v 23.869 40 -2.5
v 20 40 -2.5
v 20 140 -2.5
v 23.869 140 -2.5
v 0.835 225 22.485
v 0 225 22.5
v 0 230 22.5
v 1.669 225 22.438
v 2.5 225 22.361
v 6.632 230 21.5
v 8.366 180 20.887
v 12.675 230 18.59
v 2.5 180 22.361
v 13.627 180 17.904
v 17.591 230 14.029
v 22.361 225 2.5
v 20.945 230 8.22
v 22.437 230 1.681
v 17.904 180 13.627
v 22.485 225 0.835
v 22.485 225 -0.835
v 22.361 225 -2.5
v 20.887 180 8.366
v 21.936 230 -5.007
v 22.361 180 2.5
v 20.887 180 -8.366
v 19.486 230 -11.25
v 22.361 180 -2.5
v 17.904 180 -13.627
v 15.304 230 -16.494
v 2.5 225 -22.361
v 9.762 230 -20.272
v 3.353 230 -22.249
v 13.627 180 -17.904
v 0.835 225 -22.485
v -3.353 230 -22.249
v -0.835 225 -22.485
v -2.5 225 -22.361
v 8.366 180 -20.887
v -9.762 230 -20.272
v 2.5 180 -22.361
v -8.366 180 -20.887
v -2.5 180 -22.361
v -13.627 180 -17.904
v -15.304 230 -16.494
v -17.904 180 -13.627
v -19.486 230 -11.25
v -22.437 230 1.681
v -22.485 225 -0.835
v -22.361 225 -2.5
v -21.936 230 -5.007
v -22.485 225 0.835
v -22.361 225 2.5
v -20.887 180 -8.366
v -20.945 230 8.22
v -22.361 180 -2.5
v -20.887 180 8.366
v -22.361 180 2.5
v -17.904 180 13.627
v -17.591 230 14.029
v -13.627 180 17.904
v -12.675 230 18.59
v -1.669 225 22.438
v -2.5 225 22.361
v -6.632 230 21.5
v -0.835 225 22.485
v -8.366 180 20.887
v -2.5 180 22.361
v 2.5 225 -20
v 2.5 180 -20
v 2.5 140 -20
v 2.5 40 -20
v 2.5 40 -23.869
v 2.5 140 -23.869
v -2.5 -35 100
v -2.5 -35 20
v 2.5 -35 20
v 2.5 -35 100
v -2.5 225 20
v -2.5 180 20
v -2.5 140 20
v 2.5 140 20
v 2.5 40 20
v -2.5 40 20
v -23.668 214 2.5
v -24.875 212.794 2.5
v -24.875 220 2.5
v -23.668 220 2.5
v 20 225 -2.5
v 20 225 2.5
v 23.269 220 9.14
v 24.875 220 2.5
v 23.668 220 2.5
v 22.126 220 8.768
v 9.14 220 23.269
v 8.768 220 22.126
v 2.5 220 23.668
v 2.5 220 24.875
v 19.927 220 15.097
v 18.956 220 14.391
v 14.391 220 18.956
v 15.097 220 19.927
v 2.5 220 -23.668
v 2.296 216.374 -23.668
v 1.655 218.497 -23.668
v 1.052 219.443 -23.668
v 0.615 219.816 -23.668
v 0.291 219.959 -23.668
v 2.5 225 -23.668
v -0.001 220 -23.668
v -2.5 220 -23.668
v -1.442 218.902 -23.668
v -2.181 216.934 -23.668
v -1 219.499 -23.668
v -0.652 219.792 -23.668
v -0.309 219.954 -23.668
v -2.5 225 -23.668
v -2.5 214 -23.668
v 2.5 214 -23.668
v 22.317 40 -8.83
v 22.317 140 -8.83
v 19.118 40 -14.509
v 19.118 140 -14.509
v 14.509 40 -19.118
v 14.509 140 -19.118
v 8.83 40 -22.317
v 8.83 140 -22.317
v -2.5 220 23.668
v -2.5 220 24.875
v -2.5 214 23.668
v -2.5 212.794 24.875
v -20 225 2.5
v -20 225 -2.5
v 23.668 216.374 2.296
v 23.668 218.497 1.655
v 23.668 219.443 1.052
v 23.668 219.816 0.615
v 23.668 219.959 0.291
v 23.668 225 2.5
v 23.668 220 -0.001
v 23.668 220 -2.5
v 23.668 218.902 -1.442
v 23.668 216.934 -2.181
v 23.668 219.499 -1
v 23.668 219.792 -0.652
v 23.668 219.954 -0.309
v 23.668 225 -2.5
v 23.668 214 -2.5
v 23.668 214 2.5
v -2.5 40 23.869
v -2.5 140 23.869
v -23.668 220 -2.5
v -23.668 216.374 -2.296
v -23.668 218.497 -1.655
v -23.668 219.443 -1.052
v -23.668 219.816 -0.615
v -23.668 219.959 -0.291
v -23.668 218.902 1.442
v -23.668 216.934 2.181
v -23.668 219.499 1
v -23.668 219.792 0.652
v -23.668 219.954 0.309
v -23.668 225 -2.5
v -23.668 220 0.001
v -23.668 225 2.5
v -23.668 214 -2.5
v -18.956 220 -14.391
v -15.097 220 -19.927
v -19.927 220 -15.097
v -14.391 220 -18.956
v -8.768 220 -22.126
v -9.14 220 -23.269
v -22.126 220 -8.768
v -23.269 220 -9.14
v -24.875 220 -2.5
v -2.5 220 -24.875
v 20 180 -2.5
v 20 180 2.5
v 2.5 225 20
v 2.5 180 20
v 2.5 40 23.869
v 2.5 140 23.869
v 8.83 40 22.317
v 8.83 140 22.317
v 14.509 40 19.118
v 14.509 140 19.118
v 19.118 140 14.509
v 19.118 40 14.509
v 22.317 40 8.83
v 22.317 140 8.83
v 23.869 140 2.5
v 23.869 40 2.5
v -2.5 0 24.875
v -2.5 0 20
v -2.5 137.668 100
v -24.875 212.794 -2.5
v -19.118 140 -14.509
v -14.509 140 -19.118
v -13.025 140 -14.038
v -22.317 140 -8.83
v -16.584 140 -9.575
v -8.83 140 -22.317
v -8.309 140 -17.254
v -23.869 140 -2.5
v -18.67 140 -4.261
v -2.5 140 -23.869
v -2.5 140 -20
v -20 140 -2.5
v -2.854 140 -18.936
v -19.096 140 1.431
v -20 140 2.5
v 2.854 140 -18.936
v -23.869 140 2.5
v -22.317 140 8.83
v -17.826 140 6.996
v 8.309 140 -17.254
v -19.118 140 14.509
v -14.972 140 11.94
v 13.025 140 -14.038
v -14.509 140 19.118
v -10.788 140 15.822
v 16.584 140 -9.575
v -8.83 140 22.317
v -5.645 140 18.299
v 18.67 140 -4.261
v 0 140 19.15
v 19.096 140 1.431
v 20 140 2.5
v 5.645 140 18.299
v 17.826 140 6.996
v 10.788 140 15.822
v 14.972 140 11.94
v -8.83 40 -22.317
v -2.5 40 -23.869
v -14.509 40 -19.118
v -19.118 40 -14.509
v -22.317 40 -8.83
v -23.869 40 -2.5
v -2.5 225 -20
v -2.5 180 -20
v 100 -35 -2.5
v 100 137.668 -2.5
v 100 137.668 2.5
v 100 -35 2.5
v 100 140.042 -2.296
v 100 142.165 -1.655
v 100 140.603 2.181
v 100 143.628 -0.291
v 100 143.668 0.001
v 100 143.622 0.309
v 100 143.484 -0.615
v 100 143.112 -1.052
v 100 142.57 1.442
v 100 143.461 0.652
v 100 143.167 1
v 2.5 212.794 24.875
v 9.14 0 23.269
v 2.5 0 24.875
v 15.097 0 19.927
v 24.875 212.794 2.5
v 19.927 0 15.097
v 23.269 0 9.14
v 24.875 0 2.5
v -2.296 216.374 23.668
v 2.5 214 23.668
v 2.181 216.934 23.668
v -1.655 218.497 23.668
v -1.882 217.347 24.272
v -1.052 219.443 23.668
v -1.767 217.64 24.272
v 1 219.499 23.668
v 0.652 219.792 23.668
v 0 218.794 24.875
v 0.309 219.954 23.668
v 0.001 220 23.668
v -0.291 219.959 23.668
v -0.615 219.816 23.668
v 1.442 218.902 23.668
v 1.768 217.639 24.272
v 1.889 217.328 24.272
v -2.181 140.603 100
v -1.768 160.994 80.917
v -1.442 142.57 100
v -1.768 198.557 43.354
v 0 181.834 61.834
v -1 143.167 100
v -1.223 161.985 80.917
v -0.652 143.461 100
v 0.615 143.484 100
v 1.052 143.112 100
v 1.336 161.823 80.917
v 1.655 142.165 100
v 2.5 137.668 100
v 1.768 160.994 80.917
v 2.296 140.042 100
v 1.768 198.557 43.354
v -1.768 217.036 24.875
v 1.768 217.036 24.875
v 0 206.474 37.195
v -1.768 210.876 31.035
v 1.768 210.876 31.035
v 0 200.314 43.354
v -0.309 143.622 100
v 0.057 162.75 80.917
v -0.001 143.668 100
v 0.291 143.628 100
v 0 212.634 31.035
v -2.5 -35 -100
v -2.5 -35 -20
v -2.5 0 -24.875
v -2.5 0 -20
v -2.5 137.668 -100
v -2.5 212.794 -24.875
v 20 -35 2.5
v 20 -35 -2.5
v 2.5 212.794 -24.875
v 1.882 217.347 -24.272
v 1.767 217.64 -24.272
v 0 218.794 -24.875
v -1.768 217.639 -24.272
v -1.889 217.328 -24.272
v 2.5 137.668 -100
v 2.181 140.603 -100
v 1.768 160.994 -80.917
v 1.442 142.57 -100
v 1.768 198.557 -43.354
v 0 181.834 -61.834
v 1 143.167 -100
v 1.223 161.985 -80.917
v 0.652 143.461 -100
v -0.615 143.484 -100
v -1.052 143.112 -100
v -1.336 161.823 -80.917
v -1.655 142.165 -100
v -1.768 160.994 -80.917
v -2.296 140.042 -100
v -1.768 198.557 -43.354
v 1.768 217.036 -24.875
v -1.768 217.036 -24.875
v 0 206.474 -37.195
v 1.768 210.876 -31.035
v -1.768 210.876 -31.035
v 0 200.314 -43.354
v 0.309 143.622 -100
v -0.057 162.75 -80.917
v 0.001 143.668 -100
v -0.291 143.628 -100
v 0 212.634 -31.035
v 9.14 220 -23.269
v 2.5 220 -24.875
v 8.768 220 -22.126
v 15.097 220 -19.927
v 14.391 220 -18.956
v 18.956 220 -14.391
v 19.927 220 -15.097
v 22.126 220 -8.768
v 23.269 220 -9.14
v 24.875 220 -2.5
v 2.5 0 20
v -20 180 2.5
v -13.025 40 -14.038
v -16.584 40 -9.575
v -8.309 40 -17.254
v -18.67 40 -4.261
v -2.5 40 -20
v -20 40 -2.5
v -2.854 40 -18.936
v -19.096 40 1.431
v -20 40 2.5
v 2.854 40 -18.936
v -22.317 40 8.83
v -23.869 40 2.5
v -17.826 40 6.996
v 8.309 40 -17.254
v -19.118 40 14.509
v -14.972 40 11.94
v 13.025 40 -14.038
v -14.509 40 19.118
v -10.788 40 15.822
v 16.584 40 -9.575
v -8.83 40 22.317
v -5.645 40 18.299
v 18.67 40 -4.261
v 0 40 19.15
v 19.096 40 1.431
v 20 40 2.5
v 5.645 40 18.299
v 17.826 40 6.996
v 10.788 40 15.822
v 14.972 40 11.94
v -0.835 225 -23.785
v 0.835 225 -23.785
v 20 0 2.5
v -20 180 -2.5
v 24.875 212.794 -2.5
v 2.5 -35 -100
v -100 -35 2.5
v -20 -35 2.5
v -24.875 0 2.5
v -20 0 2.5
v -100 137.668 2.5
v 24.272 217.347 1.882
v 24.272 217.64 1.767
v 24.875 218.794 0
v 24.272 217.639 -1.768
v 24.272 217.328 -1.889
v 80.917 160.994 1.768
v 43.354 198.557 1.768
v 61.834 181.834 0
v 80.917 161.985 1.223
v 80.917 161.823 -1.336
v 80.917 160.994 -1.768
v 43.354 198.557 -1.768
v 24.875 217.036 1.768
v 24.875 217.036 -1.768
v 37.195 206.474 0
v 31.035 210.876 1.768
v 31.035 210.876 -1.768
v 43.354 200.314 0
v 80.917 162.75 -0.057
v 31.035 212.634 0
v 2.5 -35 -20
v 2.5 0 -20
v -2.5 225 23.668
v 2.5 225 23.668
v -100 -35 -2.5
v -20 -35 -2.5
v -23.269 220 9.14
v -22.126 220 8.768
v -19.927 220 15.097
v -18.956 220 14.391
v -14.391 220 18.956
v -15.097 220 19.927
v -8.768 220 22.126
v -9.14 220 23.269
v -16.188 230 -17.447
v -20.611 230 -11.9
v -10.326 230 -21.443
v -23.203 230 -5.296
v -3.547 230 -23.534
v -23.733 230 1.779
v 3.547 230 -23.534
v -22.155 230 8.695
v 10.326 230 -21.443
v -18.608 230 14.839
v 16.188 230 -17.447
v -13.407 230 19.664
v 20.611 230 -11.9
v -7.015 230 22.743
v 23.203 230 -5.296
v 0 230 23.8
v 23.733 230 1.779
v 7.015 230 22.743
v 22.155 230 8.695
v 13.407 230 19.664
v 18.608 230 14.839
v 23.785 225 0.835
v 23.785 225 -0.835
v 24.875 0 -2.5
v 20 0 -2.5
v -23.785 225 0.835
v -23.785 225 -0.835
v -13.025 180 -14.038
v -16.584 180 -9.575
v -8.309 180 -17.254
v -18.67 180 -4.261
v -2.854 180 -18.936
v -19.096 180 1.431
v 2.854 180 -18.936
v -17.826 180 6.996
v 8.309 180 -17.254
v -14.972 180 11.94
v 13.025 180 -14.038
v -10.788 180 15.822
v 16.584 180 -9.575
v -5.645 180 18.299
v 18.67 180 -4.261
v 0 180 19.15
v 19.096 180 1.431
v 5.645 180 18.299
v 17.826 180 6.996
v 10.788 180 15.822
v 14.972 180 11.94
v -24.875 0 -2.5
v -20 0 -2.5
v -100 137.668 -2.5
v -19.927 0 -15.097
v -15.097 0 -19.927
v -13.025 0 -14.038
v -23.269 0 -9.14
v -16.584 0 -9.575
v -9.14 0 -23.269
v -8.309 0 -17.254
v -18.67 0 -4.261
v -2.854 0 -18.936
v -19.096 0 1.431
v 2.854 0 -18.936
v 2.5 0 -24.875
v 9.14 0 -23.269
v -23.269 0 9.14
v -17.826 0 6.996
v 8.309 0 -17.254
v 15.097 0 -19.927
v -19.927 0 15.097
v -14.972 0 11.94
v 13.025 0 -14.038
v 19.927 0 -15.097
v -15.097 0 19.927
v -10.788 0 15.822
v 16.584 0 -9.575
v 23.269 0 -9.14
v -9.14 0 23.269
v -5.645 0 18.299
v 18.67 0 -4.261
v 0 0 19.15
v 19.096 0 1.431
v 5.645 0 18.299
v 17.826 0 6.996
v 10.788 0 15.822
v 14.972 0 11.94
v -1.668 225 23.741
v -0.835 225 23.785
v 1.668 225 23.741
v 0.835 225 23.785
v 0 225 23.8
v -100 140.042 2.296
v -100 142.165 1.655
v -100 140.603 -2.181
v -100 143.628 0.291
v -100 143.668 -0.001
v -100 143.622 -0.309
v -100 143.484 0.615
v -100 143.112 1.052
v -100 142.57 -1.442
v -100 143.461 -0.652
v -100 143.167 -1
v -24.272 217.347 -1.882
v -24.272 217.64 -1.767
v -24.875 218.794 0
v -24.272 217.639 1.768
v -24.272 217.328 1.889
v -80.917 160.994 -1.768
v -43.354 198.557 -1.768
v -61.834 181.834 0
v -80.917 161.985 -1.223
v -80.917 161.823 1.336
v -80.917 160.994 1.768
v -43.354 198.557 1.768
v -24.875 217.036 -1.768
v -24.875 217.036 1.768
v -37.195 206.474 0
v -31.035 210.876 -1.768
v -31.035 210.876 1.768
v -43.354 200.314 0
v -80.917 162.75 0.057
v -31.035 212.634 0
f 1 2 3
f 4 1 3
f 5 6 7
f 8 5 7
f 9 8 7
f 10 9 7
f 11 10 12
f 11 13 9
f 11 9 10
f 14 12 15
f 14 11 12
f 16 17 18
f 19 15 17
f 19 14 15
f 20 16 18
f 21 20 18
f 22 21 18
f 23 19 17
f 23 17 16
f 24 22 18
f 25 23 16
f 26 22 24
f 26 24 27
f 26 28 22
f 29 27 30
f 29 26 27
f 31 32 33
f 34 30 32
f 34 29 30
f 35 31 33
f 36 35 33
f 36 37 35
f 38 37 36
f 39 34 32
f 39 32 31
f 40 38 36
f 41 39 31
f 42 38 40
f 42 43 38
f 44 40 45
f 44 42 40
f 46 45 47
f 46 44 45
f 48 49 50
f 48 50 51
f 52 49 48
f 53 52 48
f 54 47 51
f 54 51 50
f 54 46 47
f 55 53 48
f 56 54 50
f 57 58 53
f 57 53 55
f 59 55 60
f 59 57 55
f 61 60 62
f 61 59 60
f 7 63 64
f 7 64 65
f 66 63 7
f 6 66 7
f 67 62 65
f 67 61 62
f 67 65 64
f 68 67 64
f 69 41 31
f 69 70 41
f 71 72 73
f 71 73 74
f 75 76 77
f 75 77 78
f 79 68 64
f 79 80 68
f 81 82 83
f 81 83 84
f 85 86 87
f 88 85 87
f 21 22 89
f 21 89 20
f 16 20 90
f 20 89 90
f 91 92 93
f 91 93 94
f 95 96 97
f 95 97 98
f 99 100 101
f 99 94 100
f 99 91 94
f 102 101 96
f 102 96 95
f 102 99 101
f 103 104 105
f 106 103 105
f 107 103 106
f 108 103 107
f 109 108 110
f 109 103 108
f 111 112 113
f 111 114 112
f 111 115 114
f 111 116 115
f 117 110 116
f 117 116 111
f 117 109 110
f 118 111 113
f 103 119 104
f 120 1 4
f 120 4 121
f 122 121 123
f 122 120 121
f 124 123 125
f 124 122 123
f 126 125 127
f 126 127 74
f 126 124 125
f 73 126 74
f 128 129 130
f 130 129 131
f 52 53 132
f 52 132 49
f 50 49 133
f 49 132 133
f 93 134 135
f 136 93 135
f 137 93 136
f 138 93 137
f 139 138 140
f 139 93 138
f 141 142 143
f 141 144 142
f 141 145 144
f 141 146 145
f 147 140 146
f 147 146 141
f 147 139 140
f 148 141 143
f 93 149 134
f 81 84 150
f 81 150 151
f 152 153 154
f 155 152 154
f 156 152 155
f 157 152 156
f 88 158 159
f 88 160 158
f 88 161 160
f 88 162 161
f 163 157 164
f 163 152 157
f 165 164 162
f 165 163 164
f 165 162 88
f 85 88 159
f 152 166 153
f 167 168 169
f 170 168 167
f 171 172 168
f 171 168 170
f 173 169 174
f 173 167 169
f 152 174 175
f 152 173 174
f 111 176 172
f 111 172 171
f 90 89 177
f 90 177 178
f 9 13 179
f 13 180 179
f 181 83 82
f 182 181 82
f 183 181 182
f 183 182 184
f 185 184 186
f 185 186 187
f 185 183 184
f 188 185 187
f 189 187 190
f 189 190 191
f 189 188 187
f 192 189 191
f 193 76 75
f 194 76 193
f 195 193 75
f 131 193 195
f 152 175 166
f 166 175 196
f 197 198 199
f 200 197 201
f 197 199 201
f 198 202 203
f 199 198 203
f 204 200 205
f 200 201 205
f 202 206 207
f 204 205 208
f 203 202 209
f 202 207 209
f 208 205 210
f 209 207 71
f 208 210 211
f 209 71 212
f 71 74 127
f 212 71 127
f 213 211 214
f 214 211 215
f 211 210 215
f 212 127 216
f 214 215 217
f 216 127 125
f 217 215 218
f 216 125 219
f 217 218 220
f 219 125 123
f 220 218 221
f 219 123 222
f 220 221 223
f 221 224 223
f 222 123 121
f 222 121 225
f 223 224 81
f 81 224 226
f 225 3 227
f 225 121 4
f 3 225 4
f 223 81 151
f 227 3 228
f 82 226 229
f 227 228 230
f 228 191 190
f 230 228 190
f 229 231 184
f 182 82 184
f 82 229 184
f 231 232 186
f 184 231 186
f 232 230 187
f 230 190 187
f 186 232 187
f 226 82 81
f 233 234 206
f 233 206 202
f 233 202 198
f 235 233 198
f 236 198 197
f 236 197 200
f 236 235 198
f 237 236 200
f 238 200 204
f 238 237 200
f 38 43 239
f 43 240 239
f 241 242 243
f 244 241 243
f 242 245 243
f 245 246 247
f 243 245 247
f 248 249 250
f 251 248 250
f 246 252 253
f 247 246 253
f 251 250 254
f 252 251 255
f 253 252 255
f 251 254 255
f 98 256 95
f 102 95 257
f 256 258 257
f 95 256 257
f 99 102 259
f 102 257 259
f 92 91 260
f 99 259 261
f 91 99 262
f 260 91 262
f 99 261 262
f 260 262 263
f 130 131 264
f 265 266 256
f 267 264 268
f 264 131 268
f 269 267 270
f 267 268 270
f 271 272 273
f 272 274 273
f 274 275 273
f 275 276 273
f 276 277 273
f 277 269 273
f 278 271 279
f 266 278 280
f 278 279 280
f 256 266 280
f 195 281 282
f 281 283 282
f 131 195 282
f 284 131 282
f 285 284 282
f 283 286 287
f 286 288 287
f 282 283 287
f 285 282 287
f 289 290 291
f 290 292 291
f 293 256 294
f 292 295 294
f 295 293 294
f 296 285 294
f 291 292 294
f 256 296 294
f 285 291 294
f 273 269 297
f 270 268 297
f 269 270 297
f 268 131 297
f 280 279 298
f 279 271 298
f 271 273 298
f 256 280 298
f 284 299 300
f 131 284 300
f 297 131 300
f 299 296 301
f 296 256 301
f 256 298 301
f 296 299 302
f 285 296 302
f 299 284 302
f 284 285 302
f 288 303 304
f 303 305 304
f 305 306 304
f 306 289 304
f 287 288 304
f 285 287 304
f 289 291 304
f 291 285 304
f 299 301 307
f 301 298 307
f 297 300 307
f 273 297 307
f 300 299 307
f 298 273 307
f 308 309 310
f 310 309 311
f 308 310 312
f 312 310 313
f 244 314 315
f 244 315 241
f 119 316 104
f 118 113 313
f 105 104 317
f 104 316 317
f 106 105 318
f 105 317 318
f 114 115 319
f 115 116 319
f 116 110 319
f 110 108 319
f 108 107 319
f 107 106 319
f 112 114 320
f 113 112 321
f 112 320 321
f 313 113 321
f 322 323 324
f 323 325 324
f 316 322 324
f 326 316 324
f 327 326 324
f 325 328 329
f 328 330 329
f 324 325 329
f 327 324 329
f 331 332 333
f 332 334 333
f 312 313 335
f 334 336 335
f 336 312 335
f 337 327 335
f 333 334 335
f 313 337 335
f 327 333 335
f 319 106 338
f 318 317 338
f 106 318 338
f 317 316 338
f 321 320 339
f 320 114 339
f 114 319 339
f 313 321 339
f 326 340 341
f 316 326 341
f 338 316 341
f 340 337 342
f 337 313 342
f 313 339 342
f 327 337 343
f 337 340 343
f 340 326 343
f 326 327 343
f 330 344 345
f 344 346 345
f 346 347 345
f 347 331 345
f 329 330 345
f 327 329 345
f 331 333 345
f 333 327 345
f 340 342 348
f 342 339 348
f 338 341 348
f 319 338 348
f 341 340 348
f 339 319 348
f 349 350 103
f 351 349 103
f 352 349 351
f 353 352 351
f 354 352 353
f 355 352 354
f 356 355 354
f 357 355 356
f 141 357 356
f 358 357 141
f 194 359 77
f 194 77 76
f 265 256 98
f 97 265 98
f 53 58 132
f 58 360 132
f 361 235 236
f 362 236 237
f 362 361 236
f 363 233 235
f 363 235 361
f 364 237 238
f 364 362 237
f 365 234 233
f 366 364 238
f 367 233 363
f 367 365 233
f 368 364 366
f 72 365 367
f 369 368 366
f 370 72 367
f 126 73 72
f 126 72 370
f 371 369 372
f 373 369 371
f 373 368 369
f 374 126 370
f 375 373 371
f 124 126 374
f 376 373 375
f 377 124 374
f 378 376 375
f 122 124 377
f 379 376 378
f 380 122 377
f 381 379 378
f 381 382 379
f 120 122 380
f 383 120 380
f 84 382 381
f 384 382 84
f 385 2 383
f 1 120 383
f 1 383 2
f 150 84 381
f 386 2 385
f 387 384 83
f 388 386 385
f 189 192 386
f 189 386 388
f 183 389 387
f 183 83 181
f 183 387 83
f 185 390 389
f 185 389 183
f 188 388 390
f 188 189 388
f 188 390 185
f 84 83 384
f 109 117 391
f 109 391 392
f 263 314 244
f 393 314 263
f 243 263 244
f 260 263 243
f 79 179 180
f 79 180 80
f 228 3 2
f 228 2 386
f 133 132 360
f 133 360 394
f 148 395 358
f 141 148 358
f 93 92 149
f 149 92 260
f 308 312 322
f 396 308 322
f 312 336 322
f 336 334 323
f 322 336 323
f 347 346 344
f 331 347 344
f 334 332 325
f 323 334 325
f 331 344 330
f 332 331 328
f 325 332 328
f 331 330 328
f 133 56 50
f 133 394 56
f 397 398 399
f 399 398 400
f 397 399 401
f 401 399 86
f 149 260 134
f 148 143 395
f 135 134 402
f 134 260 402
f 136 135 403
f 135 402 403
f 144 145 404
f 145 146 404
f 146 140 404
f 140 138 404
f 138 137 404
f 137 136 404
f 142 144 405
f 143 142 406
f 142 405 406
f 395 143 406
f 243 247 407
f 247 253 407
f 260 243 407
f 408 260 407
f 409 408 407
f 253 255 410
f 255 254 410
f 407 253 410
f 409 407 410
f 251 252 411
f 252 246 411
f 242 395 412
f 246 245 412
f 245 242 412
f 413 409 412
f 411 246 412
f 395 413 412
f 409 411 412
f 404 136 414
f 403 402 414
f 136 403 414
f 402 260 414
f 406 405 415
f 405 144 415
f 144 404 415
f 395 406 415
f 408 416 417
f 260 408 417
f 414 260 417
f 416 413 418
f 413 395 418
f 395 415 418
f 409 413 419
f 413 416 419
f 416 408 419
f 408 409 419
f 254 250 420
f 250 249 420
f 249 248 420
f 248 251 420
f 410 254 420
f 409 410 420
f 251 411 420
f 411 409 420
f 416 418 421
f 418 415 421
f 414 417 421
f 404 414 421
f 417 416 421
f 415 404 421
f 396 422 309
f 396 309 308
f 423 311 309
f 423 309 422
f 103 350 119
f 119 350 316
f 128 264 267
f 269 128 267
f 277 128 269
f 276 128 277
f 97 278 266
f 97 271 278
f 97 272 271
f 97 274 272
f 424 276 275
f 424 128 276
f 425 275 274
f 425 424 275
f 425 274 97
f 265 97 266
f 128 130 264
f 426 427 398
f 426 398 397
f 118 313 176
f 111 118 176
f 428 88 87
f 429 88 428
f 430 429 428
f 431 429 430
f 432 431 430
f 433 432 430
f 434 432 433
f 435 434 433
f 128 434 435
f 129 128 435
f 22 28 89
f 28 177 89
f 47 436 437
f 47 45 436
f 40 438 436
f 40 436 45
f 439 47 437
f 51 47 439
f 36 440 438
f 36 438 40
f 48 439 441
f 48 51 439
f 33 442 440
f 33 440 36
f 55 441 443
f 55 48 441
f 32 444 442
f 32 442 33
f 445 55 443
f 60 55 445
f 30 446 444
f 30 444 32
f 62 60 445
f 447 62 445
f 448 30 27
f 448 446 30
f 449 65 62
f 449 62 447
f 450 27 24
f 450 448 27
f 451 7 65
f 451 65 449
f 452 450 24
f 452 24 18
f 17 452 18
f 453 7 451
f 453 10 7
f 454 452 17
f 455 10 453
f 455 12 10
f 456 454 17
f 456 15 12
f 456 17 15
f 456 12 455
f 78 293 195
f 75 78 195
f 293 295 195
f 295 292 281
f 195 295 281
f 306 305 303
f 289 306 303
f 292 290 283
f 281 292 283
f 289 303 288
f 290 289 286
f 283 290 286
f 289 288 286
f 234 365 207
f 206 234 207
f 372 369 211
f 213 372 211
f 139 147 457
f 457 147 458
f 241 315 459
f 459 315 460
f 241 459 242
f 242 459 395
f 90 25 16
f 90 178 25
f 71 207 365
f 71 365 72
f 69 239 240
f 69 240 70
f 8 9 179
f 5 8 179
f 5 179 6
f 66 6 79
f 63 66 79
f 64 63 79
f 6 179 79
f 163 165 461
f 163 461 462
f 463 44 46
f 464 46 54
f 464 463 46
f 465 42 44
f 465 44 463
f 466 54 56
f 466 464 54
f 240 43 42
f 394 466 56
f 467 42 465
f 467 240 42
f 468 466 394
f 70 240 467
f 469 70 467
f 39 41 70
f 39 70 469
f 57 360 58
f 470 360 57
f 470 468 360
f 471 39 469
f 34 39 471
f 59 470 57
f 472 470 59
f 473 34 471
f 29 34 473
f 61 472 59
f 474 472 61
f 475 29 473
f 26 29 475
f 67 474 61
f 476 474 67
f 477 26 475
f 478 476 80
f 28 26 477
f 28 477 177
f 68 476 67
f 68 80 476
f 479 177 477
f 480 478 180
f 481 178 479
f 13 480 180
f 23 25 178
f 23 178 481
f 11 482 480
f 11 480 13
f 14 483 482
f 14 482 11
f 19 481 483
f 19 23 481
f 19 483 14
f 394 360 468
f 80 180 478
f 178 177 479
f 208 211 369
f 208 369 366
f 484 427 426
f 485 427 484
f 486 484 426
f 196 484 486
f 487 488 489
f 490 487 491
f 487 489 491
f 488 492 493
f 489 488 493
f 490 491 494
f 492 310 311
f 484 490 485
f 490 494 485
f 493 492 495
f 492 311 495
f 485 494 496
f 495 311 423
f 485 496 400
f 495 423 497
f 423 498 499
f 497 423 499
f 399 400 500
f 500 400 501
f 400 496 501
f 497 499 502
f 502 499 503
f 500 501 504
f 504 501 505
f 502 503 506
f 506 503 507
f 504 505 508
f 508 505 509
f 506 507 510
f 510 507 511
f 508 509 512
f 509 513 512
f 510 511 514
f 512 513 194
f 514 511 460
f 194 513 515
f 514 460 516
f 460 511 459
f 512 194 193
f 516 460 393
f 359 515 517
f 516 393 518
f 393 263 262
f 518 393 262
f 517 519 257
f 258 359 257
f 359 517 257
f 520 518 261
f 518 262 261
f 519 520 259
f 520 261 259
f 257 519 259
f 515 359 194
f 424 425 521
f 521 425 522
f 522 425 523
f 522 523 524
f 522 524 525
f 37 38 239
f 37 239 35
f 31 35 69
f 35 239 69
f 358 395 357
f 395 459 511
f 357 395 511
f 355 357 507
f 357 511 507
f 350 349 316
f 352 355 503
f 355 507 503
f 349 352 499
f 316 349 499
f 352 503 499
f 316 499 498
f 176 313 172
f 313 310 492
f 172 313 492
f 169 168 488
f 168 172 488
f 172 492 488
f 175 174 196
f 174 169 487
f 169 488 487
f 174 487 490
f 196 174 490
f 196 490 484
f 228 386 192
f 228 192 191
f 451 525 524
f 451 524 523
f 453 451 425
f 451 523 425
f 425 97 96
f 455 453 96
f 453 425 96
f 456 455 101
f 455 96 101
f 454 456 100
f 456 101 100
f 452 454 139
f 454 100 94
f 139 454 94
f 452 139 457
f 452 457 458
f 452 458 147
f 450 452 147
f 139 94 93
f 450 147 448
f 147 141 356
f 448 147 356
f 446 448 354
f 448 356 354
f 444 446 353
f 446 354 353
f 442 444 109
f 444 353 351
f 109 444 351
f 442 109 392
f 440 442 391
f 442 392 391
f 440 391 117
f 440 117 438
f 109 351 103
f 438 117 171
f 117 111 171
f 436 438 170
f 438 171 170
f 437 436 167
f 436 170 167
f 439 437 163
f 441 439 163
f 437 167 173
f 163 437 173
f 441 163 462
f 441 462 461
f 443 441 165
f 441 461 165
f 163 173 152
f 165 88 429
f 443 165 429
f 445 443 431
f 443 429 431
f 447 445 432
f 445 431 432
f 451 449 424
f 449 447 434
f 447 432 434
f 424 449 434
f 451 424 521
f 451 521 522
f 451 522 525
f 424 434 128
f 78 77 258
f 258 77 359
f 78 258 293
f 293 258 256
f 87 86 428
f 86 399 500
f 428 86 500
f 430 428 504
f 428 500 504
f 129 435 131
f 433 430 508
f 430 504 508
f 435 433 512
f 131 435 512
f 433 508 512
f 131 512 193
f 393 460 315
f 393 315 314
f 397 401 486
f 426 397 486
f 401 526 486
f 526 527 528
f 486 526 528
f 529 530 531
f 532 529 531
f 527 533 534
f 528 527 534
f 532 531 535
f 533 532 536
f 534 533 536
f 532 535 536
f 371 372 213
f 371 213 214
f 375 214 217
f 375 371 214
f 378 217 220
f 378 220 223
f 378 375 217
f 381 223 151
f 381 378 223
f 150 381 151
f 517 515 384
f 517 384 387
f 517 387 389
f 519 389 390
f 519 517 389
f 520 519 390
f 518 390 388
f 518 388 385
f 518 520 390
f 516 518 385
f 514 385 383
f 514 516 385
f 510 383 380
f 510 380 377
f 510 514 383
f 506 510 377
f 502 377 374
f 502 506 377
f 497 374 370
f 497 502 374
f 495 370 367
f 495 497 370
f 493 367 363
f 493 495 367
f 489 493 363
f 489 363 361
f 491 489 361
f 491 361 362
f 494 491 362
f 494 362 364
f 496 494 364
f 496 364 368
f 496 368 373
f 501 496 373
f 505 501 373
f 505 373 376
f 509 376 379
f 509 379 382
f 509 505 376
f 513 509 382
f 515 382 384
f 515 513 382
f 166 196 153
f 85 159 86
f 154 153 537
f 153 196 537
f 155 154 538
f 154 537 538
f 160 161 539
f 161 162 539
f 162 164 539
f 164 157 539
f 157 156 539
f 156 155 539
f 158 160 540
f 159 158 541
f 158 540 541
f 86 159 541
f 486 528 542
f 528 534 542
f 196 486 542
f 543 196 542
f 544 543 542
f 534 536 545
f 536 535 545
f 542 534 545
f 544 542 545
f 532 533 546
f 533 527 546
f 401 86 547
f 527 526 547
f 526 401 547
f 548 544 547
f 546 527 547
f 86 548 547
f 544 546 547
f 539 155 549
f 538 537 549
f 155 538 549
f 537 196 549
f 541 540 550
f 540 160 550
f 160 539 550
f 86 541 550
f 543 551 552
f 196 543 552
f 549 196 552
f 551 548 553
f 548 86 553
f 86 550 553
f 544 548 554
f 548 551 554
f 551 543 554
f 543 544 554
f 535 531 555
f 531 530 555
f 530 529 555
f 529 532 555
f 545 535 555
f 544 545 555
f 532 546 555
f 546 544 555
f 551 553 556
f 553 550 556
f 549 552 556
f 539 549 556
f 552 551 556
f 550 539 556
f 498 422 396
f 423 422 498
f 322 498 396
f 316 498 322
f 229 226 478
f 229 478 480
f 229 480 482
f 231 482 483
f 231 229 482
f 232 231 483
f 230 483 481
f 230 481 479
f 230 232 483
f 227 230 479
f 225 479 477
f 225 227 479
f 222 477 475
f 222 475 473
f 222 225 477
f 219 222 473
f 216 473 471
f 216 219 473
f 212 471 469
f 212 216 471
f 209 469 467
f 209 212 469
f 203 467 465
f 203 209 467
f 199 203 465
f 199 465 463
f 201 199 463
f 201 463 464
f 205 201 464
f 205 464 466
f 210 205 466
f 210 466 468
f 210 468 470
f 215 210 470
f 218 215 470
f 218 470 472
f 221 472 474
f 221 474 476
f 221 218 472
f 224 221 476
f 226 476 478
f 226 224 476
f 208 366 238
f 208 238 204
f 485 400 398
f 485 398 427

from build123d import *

# Parameters (mm, degrees)
SKETCH_1_R               = 25
SKETCH_1_R_2             = 19.15
EXTRUDE_1_DEPTH          = 40
SKETCH_2_R               = 25
SKETCH_2_R_2             = 24
EXTRUDE_2_DEPTH          = 100
SKETCH_4_R               = 25
SKETCH_4_R_2             = 19.15
EXTRUDE_3_DEPTH          = 40
SKETCH_5_R               = 25
SKETCH_5_R_2             = 22.5
EXTRUDE_4_DEPTH          = 40
SKETCH_6_R               = 23.8
SKETCH_6_R_2             = 22.5
EXTRUDE_5_DEPTH          = 10
EXTRUDE_START            = -20
SKETCH_8_W               = 5
SKETCH_8_H               = 270
EXTRUDE_6_DEPTH          = 80
SKETCH_10_W              = 80
SKETCH_10_H              = 10
CUT_EXTRUDE_2_DEPTH      = 80
CUT_EXTRUDE_3_DEPTH      = 80
PATTERN_CIRCULAR_1_COUNT = 4


with BuildPart() as part:
    # Эскиз1 → Бобышка-Вытянуть1 (new body)
    with BuildSketch(Plane(origin=(0, 0, 0), x_dir=(1, 0, 0), z_dir=(0, 1, 0))):
        with Locations(Location((0, 0, 0), (0, 0, 270))):
            Circle(SKETCH_1_R)
        with Locations(Location((0, 0, 0), (0, 0, 270))):
            Circle(SKETCH_1_R_2, mode=Mode.SUBTRACT)
    extrude(amount=EXTRUDE_1_DEPTH)

    # Эскиз2 → Бобышка-Вытянуть2 (add)
    with BuildSketch(Plane(origin=(0, 40, 0), x_dir=(1, 0, 0), z_dir=(0, 1, 0))):
        with Locations(Location((0, 0, 0), (0, 0, 270))):
            Circle(SKETCH_2_R)
        with Locations(Location((0, 0, 0), (0, 0, 270))):
            Circle(SKETCH_2_R_2, mode=Mode.SUBTRACT)
    extrude(amount=EXTRUDE_2_DEPTH)

    # Эскиз4 → Бобышка-Вытянуть3 (add)
    with BuildSketch(Plane(origin=(0, 140, 0), x_dir=(1, 0, 0), z_dir=(0, 1, 0))):
        with Locations(Location((0, 0, 0), (0, 0, 270))):
            Circle(SKETCH_4_R)
        with Locations(Location((0, 0, 0), (0, 0, 270))):
            Circle(SKETCH_4_R_2, mode=Mode.SUBTRACT)
    extrude(amount=EXTRUDE_3_DEPTH)

    # Эскиз5 → Бобышка-Вытянуть4 (add)
    with BuildSketch(Plane(origin=(0, 180, 0), x_dir=(1, 0, 0), z_dir=(0, 1, 0))):
        with Locations(Location((0, 0, 0), (0, 0, 270))):
            Circle(SKETCH_5_R)
        with Locations(Location((0, 0, 0), (0, 0, 270))):
            Circle(SKETCH_5_R_2, mode=Mode.SUBTRACT)
    extrude(amount=EXTRUDE_4_DEPTH)

    # Эскиз6 → Бобышка-Вытянуть5 (add)
    with BuildSketch(Plane(origin=(0, 220, 0), x_dir=(1, 0, 0), z_dir=(0, 1, 0))):
        with Locations(Location((0, 0, 0), (0, 0, 270))):
            Circle(SKETCH_6_R)
        with Locations(Location((0, 0, 0), (0, 0, 270))):
            Circle(SKETCH_6_R_2, mode=Mode.SUBTRACT)
    extrude(amount=EXTRUDE_5_DEPTH)

    # Эскиз8 → Бобышка-Вытянуть6 (add)
    with BuildSketch(Plane.XY.offset(EXTRUDE_START)):
        with Locations((0, 90)):
            Rectangle(SKETCH_8_W, SKETCH_8_H)
    extrude_6 = extrude(amount=-EXTRUDE_6_DEPTH)

    # Эскиз10 → Вырез-Вытянуть2 (cut)
    with BuildSketch(Plane(origin=(2.5, 0, 0), x_dir=(0, 0, -1), z_dir=(1, 0, 0))):
        with Locations((60, -40)):
            Rectangle(SKETCH_10_W, SKETCH_10_H)
    cut_extrude_2 = extrude(amount=-CUT_EXTRUDE_2_DEPTH, mode=Mode.SUBTRACT)

    # Эскиз12 → Вырез-Вытянуть3 (cut)
    with BuildSketch(Plane(origin=(2.5, 0, 0), x_dir=(0, 0, -1), z_dir=(1, 0, 0))):
        Polygon((24.874685928, 220), (23.668333275, 220), (23.668333275, 225), (100, 225), (100, 144.874685928), align=None)
    cut_extrude_3 = extrude(amount=-CUT_EXTRUDE_3_DEPTH, mode=Mode.SUBTRACT)

    # Вырез-По траектории10: sweep along a path in Эскиз13
    with BuildLine(Plane(origin=(0, 122.437342964, -122.437342964), x_dir=(1, 0, 0), z_dir=(0, 0.7071067811865489, -0.7071067811865462))) as sweep_10_path:
        Line((0, -139.680473045), (0, -31.731194723))
    # Эскиз14 → Вырез-По траектории10 (sweep, cut)
    with BuildSketch(Plane(origin=(0, 0, -23.668333275), x_dir=(-1, 0, 0), z_dir=(0, 0, -1))):
        with BuildLine():
            Line((-2.5, 214), (-2.5, 220))
            Line((-2.5, 220), (-2.5, 225))
            Line((-2.5, 225), (2.5, 225))
            Line((2.5, 225), (2.5, 220))
            Line((2.5, 220), (2.5, 214))
            add(Edge.make_bspline(
                [(2.5, 214), (2.5, 220), (0, 220), (-2.5, 220), (-2.5, 214)],
                knots=[4.71238898, 4.71238898, 4.71238898, 6.283185307, 6.283185307, 7.853981634, 7.853981634, 7.853981634], degree=2, weights=[1, 0.707106781, 1, 0.707106781, 1]))
        make_face()
    sweep_10 = sweep(path=sweep_10_path.line, mode=Mode.SUBTRACT)

    # Круговой массив1: Бобышка-Вытянуть6, Вырез-Вытянуть2, Вырез-Вытянуть3, Вырез-По траектории10 ×4 about axis
    pattern_circular_1_axis = Axis((0, 40, 0), (0, -1, 0))
    add([extrude_6.rotate(pattern_circular_1_axis, i * 360 / PATTERN_CIRCULAR_1_COUNT) for i in range(1, PATTERN_CIRCULAR_1_COUNT)])
    add([cut_extrude_2.rotate(pattern_circular_1_axis, i * 360 / PATTERN_CIRCULAR_1_COUNT) for i in range(1, PATTERN_CIRCULAR_1_COUNT)], mode=Mode.SUBTRACT)
    add([cut_extrude_3.rotate(pattern_circular_1_axis, i * 360 / PATTERN_CIRCULAR_1_COUNT) for i in range(1, PATTERN_CIRCULAR_1_COUNT)], mode=Mode.SUBTRACT)
    add([sweep_10.rotate(pattern_circular_1_axis, i * 360 / PATTERN_CIRCULAR_1_COUNT) for i in range(1, PATTERN_CIRCULAR_1_COUNT)], mode=Mode.SUBTRACT)


solid = part.part
